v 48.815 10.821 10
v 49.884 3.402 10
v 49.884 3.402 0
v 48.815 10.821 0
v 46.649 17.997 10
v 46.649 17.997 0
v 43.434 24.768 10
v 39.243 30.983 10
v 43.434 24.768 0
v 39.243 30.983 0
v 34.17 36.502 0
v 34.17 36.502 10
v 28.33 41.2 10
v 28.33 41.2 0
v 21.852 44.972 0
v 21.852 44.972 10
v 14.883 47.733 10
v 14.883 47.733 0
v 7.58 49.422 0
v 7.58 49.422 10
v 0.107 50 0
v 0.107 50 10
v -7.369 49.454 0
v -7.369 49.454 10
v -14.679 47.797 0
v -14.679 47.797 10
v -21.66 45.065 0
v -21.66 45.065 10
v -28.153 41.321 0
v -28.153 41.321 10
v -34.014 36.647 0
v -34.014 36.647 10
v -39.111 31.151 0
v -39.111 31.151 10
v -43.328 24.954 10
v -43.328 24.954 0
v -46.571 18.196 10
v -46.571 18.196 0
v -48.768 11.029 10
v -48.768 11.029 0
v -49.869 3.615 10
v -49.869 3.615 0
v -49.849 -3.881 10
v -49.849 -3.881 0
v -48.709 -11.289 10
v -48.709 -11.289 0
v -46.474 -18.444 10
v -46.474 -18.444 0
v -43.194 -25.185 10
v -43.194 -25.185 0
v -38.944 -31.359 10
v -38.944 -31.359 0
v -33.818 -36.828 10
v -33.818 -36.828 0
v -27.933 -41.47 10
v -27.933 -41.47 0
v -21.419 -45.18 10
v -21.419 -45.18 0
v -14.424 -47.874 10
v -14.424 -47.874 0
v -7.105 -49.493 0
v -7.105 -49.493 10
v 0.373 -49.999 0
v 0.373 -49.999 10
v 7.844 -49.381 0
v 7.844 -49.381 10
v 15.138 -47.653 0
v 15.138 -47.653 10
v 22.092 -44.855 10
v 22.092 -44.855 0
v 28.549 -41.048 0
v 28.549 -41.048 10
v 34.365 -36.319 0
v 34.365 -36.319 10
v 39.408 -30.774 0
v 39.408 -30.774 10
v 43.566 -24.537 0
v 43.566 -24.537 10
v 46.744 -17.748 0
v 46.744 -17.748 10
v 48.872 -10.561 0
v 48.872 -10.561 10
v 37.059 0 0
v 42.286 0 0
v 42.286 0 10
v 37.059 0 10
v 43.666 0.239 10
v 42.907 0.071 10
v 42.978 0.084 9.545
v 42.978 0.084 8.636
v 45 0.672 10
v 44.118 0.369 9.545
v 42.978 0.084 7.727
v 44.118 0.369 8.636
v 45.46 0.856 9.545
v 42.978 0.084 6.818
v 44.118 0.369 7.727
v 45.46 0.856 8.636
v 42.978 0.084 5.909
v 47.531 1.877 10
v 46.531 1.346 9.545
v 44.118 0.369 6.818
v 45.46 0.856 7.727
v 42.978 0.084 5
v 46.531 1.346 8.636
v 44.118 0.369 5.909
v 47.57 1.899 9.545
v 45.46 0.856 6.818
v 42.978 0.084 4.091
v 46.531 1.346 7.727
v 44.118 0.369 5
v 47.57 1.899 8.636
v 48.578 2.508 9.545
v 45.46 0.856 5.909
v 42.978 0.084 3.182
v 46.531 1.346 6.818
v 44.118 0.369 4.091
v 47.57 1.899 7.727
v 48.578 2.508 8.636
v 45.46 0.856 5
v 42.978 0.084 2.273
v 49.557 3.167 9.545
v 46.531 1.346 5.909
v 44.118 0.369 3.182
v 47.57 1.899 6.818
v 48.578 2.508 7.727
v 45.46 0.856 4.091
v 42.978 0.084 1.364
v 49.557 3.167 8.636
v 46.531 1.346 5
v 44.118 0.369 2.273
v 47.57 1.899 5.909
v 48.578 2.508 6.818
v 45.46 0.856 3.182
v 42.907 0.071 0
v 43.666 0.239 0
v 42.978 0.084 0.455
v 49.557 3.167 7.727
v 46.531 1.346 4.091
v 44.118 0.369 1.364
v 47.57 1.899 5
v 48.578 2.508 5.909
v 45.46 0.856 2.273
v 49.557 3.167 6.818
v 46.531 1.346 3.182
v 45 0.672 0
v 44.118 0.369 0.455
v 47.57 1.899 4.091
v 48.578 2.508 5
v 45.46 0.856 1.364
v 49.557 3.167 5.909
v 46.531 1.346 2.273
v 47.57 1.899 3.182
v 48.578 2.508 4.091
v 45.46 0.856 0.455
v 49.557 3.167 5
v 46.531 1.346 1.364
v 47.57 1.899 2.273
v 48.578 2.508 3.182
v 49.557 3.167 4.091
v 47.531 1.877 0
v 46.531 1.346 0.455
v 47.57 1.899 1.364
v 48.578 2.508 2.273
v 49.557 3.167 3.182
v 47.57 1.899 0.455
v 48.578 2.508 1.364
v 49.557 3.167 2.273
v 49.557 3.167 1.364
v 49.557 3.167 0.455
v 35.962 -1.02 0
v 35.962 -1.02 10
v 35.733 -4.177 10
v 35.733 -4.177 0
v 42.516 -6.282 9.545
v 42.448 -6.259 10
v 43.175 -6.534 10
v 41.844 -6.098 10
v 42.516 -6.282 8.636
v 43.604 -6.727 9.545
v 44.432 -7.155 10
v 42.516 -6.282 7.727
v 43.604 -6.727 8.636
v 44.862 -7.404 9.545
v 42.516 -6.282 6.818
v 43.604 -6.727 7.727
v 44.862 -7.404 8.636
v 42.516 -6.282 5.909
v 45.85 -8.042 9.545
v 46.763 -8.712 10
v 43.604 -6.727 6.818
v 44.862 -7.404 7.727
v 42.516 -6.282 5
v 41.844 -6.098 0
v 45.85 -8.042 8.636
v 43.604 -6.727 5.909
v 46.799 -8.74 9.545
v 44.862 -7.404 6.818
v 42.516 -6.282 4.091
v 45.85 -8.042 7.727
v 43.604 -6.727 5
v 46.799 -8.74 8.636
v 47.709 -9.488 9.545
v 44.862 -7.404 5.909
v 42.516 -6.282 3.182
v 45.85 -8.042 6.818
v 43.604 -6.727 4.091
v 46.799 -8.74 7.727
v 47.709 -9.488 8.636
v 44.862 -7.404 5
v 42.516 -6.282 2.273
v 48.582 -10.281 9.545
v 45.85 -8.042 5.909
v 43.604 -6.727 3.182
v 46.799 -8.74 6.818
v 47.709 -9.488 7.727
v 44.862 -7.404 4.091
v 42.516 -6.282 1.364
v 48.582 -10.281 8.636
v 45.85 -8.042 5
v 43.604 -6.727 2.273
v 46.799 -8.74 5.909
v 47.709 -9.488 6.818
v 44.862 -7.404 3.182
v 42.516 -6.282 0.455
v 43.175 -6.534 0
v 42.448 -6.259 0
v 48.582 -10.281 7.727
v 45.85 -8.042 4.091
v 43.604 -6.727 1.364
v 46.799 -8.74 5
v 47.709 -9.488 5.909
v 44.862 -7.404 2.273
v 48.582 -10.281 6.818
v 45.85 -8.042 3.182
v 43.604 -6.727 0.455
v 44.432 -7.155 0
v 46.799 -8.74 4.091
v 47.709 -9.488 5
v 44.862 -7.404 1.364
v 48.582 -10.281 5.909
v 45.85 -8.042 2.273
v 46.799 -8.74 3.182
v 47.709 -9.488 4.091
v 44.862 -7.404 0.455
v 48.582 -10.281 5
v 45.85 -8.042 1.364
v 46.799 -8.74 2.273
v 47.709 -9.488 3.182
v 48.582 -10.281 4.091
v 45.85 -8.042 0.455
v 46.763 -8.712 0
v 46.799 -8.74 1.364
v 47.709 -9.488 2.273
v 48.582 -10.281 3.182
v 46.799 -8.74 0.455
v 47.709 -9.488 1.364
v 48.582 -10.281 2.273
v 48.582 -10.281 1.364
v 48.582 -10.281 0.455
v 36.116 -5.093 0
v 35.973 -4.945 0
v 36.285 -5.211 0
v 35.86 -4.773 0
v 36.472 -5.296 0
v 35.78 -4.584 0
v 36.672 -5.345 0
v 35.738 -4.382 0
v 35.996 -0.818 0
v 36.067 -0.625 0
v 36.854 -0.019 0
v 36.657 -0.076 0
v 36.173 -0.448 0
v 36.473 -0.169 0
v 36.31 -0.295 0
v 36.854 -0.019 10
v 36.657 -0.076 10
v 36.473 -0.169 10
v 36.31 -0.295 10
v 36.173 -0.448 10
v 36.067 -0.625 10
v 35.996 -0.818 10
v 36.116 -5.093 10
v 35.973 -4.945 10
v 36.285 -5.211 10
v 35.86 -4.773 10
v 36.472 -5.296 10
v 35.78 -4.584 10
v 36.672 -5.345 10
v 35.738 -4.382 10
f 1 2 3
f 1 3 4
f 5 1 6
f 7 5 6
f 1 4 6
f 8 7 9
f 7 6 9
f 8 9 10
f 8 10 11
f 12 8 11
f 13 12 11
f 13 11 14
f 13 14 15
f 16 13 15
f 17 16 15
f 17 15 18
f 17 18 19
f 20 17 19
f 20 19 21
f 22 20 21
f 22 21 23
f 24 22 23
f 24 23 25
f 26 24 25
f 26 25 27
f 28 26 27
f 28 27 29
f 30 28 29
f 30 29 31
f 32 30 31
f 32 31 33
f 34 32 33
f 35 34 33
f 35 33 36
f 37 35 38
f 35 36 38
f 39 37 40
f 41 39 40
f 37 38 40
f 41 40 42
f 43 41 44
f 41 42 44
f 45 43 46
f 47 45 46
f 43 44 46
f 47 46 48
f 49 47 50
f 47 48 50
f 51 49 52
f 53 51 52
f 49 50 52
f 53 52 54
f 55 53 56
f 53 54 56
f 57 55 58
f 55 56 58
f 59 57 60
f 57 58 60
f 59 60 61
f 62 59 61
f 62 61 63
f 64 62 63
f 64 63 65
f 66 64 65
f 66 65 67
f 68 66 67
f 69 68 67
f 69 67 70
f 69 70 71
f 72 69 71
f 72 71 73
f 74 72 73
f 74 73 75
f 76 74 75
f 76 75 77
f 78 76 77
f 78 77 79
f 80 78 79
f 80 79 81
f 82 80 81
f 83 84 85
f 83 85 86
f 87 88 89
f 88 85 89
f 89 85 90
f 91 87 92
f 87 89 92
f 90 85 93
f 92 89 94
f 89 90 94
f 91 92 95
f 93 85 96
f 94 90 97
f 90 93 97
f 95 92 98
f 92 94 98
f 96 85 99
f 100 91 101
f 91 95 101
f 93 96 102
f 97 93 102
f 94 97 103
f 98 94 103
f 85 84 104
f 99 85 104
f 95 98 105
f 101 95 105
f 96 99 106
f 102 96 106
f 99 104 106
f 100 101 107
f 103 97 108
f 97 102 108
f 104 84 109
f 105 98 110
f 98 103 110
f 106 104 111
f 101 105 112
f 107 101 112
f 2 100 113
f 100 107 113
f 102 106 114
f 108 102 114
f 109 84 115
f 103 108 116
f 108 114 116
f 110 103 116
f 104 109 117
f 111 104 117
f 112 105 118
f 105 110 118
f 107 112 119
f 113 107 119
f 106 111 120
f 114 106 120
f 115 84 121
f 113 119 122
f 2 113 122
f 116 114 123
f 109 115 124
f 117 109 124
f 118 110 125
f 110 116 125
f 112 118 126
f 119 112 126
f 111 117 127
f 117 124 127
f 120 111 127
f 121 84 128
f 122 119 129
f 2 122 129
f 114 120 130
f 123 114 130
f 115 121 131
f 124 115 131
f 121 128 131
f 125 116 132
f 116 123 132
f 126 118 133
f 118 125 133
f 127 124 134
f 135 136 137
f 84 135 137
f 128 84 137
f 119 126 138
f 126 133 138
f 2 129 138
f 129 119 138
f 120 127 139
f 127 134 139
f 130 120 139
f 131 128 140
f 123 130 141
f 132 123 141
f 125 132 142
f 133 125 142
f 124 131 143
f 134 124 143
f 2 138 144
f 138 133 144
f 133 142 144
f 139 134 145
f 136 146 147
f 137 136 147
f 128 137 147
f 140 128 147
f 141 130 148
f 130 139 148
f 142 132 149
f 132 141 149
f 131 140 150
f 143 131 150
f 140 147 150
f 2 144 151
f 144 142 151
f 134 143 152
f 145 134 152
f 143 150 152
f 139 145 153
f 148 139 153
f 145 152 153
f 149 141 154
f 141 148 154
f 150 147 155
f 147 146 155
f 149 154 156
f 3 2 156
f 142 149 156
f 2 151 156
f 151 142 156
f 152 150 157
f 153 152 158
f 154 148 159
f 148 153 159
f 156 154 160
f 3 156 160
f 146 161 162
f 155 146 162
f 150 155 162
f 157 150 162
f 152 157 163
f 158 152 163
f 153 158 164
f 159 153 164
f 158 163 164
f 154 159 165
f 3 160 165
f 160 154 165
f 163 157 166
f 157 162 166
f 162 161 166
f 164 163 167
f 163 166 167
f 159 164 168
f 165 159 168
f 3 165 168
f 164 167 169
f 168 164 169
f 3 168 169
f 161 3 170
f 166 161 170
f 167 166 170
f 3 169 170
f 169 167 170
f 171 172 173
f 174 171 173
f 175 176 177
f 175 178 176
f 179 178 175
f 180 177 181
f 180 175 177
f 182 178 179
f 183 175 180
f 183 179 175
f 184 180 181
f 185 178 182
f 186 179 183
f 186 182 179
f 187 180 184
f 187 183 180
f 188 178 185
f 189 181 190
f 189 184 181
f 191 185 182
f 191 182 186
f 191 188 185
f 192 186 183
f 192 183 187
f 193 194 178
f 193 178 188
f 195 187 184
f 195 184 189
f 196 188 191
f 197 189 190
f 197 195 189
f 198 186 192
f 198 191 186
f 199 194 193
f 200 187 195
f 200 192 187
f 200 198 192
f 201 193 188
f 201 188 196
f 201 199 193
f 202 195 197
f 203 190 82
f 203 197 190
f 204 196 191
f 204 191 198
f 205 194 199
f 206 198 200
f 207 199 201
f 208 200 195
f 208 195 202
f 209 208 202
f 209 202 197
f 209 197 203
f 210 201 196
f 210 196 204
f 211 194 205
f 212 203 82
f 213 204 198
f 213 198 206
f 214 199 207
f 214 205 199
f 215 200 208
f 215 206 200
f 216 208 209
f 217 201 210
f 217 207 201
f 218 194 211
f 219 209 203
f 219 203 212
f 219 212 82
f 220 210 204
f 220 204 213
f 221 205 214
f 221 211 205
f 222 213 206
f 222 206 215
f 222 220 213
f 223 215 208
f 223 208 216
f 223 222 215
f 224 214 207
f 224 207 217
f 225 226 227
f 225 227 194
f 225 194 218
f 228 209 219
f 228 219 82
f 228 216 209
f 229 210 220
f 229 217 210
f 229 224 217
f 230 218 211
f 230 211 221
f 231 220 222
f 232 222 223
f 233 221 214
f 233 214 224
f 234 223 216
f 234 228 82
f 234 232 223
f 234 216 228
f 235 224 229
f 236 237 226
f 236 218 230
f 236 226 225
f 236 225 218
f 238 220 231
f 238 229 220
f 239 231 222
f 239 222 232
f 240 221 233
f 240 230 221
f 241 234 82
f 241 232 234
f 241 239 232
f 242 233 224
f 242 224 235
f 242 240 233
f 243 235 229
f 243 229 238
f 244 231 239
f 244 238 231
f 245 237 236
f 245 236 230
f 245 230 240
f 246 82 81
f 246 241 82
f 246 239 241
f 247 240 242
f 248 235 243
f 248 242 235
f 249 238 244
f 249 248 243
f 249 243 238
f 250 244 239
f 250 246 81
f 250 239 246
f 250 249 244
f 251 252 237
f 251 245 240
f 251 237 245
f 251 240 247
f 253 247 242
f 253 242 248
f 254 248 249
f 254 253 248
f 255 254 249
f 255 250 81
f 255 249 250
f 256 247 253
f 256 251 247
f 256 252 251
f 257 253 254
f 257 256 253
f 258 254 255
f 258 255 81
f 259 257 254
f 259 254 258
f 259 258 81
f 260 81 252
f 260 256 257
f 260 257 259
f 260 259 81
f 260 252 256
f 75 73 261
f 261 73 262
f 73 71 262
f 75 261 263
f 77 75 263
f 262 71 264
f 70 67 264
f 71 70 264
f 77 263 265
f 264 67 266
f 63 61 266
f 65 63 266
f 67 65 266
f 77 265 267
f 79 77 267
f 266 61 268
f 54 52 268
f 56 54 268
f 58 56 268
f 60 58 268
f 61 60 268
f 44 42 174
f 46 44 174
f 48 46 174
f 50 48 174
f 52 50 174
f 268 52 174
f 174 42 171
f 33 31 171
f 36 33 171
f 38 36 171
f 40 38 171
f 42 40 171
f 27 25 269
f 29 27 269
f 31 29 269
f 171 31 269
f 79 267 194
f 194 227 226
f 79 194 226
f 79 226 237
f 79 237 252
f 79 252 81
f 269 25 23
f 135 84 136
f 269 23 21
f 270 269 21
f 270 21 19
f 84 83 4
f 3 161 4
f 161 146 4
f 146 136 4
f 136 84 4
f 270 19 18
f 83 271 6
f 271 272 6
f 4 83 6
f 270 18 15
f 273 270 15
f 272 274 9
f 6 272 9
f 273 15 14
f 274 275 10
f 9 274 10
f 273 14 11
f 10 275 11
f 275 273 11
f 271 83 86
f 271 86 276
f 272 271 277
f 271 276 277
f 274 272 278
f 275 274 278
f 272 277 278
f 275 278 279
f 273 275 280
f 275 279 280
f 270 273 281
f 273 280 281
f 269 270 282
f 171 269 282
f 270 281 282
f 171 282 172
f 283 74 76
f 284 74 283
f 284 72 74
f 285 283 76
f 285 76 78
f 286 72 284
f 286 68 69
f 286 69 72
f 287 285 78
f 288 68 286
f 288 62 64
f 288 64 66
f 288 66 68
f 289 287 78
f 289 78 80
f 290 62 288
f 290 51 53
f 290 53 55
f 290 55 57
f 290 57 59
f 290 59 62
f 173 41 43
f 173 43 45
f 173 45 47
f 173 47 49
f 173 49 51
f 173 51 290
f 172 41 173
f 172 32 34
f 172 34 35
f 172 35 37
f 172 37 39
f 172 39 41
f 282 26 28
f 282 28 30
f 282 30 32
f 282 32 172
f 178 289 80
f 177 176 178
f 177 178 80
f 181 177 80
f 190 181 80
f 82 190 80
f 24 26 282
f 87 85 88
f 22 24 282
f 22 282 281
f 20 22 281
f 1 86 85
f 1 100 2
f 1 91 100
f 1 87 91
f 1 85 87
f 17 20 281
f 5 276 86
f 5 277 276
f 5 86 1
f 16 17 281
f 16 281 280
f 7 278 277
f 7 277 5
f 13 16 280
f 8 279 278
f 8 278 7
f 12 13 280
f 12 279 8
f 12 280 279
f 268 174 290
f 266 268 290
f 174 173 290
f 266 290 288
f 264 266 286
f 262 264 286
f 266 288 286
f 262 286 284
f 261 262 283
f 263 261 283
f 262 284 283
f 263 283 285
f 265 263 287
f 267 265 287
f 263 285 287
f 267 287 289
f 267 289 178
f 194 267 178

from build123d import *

# Parameters (mm, degrees)
SKETCH2_R               = 50
BOSS_EXTRUDE1_DEPTH     = 10
CUT_EXTRUDE1_DEPTH      = 72.414284285
CUT_EXTRUDE1_DEPTH_BACK = 72.414284285
FILLET2_R               = 1.1


with BuildPart() as part:
    # Sketch2 → Boss-Extrude1 (new body)
    with BuildSketch(Plane.XY):
        Circle(SKETCH2_R)
    extrude(amount=BOSS_EXTRUDE1_DEPTH)

    # Sketch4 → Cut-Extrude1 (cut, two sides: drawn at the far end of the back side and taken through both)
    with BuildSketch(Plane.XY.offset(10).offset(-CUT_EXTRUDE1_DEPTH_BACK)):
        with BuildLine():
            add(Edge.make_bspline(
                [(42.286167935, 0), (42.300623625, 0.000207972), (42.341158058, 0.001435323), (42.417735849, 0.006298791), (42.542526621, 0.017843628), (42.701219946, 0.037852947), (42.905849783, 0.069790126), (43.146163964, 0.115211019), (43.409330629, 0.17327731), (43.694480037, 0.245219326), (43.977805099, 0.324724197), (44.259247021, 0.411205938), (44.538460268, 0.503808989), (44.875197444, 0.623574823), (45.276841168, 0.777725041), (45.742862789, 0.973159706), (46.267095665, 1.212747198), (46.796326187, 1.475938928), (47.312791354, 1.750494209), (47.829241884, 2.045617008), (48.325100599, 2.343712939), (48.834136207, 2.671254069), (49.264664533, 2.95849553), (49.608043611, 3.202248044), (49.805138833, 3.344334313), (49.884141613, 3.401825328)],
                knots=[0, 0, 0, 0, 0, 0.005376749, 0.015083688, 0.02853182, 0.04661014, 0.064854849, 0.092110525, 0.119476176, 0.146842496, 0.174208854, 0.201574956, 0.228941013, 0.256307345, 0.307035032, 0.361767352, 0.416499661, 0.471231937, 0.525964282, 0.580696616, 0.635428982, 0.690161387, 0.744893688, 0.782595304, 0.782595304, 0.782595304, 0.782595304, 0.782595304], degree=4))
            Line((42.286167935, 0), (36.036167935, 0))
            Line((36.036167935, 0), (35.65943594, -5.197117271))
            Line((35.65943594, -5.197117271), (41.844096723, -6.098488999))
            add(Edge.make_bspline(
                [(41.844096723, -6.098488999), (41.858371296, -6.100779588), (41.898304962, -6.107839963), (41.973380782, -6.123696596), (42.095201966, -6.153118), (42.249350534, -6.195804805), (42.447235152, -6.256919711), (42.678486444, -6.336523746), (42.930527603, -6.431936755), (43.202320541, -6.544250768), (43.471217494, -6.663785466), (43.737244794, -6.78995251), (44.000183905, -6.921855451), (44.316128172, -7.088933279), (44.691341539, -7.299396816), (45.124305757, -7.559997748), (45.608504976, -7.872685118), (46.094245403, -8.209450717), (46.565715083, -8.555620057), (47.034204041, -8.922139787), (47.481887674, -9.288631826), (47.938363873, -9.686161599), (48.322965525, -10.03249073), (48.627600964, -10.323216938), (48.802144091, -10.492242768), (48.87202963, -10.560526495)],
                knots=[0, 0, 0, 0, 0, 0.005376749, 0.015083688, 0.02853182, 0.04661014, 0.064854849, 0.092110525, 0.119476176, 0.146842496, 0.174208854, 0.201574956, 0.228941013, 0.256307345, 0.307035032, 0.361767352, 0.416499661, 0.471231937, 0.525964282, 0.580696616, 0.635428982, 0.690161387, 0.744893688, 0.782595304, 0.782595304, 0.782595304, 0.782595304, 0.782595304], degree=4))
            ThreePointArc((48.87202963, -10.560526495), (49.717207693, -5.310297473), (50, 0))
            ThreePointArc((50, 0), (49.971027009, 1.701898846), (49.884141613, 3.401825328))
        make_face()
    extrude(amount=CUT_EXTRUDE1_DEPTH + CUT_EXTRUDE1_DEPTH_BACK, mode=Mode.SUBTRACT)

    # Fillet2
    fillet2_edges = [part.edges().sort_by_distance(p)[0] for p in [
        (36.036167935, 0, 5),
        (35.65943594, -5.197117271, 5),
    ]]
    fillet(fillet2_edges, radius=FILLET2_R)


solid = part.part
